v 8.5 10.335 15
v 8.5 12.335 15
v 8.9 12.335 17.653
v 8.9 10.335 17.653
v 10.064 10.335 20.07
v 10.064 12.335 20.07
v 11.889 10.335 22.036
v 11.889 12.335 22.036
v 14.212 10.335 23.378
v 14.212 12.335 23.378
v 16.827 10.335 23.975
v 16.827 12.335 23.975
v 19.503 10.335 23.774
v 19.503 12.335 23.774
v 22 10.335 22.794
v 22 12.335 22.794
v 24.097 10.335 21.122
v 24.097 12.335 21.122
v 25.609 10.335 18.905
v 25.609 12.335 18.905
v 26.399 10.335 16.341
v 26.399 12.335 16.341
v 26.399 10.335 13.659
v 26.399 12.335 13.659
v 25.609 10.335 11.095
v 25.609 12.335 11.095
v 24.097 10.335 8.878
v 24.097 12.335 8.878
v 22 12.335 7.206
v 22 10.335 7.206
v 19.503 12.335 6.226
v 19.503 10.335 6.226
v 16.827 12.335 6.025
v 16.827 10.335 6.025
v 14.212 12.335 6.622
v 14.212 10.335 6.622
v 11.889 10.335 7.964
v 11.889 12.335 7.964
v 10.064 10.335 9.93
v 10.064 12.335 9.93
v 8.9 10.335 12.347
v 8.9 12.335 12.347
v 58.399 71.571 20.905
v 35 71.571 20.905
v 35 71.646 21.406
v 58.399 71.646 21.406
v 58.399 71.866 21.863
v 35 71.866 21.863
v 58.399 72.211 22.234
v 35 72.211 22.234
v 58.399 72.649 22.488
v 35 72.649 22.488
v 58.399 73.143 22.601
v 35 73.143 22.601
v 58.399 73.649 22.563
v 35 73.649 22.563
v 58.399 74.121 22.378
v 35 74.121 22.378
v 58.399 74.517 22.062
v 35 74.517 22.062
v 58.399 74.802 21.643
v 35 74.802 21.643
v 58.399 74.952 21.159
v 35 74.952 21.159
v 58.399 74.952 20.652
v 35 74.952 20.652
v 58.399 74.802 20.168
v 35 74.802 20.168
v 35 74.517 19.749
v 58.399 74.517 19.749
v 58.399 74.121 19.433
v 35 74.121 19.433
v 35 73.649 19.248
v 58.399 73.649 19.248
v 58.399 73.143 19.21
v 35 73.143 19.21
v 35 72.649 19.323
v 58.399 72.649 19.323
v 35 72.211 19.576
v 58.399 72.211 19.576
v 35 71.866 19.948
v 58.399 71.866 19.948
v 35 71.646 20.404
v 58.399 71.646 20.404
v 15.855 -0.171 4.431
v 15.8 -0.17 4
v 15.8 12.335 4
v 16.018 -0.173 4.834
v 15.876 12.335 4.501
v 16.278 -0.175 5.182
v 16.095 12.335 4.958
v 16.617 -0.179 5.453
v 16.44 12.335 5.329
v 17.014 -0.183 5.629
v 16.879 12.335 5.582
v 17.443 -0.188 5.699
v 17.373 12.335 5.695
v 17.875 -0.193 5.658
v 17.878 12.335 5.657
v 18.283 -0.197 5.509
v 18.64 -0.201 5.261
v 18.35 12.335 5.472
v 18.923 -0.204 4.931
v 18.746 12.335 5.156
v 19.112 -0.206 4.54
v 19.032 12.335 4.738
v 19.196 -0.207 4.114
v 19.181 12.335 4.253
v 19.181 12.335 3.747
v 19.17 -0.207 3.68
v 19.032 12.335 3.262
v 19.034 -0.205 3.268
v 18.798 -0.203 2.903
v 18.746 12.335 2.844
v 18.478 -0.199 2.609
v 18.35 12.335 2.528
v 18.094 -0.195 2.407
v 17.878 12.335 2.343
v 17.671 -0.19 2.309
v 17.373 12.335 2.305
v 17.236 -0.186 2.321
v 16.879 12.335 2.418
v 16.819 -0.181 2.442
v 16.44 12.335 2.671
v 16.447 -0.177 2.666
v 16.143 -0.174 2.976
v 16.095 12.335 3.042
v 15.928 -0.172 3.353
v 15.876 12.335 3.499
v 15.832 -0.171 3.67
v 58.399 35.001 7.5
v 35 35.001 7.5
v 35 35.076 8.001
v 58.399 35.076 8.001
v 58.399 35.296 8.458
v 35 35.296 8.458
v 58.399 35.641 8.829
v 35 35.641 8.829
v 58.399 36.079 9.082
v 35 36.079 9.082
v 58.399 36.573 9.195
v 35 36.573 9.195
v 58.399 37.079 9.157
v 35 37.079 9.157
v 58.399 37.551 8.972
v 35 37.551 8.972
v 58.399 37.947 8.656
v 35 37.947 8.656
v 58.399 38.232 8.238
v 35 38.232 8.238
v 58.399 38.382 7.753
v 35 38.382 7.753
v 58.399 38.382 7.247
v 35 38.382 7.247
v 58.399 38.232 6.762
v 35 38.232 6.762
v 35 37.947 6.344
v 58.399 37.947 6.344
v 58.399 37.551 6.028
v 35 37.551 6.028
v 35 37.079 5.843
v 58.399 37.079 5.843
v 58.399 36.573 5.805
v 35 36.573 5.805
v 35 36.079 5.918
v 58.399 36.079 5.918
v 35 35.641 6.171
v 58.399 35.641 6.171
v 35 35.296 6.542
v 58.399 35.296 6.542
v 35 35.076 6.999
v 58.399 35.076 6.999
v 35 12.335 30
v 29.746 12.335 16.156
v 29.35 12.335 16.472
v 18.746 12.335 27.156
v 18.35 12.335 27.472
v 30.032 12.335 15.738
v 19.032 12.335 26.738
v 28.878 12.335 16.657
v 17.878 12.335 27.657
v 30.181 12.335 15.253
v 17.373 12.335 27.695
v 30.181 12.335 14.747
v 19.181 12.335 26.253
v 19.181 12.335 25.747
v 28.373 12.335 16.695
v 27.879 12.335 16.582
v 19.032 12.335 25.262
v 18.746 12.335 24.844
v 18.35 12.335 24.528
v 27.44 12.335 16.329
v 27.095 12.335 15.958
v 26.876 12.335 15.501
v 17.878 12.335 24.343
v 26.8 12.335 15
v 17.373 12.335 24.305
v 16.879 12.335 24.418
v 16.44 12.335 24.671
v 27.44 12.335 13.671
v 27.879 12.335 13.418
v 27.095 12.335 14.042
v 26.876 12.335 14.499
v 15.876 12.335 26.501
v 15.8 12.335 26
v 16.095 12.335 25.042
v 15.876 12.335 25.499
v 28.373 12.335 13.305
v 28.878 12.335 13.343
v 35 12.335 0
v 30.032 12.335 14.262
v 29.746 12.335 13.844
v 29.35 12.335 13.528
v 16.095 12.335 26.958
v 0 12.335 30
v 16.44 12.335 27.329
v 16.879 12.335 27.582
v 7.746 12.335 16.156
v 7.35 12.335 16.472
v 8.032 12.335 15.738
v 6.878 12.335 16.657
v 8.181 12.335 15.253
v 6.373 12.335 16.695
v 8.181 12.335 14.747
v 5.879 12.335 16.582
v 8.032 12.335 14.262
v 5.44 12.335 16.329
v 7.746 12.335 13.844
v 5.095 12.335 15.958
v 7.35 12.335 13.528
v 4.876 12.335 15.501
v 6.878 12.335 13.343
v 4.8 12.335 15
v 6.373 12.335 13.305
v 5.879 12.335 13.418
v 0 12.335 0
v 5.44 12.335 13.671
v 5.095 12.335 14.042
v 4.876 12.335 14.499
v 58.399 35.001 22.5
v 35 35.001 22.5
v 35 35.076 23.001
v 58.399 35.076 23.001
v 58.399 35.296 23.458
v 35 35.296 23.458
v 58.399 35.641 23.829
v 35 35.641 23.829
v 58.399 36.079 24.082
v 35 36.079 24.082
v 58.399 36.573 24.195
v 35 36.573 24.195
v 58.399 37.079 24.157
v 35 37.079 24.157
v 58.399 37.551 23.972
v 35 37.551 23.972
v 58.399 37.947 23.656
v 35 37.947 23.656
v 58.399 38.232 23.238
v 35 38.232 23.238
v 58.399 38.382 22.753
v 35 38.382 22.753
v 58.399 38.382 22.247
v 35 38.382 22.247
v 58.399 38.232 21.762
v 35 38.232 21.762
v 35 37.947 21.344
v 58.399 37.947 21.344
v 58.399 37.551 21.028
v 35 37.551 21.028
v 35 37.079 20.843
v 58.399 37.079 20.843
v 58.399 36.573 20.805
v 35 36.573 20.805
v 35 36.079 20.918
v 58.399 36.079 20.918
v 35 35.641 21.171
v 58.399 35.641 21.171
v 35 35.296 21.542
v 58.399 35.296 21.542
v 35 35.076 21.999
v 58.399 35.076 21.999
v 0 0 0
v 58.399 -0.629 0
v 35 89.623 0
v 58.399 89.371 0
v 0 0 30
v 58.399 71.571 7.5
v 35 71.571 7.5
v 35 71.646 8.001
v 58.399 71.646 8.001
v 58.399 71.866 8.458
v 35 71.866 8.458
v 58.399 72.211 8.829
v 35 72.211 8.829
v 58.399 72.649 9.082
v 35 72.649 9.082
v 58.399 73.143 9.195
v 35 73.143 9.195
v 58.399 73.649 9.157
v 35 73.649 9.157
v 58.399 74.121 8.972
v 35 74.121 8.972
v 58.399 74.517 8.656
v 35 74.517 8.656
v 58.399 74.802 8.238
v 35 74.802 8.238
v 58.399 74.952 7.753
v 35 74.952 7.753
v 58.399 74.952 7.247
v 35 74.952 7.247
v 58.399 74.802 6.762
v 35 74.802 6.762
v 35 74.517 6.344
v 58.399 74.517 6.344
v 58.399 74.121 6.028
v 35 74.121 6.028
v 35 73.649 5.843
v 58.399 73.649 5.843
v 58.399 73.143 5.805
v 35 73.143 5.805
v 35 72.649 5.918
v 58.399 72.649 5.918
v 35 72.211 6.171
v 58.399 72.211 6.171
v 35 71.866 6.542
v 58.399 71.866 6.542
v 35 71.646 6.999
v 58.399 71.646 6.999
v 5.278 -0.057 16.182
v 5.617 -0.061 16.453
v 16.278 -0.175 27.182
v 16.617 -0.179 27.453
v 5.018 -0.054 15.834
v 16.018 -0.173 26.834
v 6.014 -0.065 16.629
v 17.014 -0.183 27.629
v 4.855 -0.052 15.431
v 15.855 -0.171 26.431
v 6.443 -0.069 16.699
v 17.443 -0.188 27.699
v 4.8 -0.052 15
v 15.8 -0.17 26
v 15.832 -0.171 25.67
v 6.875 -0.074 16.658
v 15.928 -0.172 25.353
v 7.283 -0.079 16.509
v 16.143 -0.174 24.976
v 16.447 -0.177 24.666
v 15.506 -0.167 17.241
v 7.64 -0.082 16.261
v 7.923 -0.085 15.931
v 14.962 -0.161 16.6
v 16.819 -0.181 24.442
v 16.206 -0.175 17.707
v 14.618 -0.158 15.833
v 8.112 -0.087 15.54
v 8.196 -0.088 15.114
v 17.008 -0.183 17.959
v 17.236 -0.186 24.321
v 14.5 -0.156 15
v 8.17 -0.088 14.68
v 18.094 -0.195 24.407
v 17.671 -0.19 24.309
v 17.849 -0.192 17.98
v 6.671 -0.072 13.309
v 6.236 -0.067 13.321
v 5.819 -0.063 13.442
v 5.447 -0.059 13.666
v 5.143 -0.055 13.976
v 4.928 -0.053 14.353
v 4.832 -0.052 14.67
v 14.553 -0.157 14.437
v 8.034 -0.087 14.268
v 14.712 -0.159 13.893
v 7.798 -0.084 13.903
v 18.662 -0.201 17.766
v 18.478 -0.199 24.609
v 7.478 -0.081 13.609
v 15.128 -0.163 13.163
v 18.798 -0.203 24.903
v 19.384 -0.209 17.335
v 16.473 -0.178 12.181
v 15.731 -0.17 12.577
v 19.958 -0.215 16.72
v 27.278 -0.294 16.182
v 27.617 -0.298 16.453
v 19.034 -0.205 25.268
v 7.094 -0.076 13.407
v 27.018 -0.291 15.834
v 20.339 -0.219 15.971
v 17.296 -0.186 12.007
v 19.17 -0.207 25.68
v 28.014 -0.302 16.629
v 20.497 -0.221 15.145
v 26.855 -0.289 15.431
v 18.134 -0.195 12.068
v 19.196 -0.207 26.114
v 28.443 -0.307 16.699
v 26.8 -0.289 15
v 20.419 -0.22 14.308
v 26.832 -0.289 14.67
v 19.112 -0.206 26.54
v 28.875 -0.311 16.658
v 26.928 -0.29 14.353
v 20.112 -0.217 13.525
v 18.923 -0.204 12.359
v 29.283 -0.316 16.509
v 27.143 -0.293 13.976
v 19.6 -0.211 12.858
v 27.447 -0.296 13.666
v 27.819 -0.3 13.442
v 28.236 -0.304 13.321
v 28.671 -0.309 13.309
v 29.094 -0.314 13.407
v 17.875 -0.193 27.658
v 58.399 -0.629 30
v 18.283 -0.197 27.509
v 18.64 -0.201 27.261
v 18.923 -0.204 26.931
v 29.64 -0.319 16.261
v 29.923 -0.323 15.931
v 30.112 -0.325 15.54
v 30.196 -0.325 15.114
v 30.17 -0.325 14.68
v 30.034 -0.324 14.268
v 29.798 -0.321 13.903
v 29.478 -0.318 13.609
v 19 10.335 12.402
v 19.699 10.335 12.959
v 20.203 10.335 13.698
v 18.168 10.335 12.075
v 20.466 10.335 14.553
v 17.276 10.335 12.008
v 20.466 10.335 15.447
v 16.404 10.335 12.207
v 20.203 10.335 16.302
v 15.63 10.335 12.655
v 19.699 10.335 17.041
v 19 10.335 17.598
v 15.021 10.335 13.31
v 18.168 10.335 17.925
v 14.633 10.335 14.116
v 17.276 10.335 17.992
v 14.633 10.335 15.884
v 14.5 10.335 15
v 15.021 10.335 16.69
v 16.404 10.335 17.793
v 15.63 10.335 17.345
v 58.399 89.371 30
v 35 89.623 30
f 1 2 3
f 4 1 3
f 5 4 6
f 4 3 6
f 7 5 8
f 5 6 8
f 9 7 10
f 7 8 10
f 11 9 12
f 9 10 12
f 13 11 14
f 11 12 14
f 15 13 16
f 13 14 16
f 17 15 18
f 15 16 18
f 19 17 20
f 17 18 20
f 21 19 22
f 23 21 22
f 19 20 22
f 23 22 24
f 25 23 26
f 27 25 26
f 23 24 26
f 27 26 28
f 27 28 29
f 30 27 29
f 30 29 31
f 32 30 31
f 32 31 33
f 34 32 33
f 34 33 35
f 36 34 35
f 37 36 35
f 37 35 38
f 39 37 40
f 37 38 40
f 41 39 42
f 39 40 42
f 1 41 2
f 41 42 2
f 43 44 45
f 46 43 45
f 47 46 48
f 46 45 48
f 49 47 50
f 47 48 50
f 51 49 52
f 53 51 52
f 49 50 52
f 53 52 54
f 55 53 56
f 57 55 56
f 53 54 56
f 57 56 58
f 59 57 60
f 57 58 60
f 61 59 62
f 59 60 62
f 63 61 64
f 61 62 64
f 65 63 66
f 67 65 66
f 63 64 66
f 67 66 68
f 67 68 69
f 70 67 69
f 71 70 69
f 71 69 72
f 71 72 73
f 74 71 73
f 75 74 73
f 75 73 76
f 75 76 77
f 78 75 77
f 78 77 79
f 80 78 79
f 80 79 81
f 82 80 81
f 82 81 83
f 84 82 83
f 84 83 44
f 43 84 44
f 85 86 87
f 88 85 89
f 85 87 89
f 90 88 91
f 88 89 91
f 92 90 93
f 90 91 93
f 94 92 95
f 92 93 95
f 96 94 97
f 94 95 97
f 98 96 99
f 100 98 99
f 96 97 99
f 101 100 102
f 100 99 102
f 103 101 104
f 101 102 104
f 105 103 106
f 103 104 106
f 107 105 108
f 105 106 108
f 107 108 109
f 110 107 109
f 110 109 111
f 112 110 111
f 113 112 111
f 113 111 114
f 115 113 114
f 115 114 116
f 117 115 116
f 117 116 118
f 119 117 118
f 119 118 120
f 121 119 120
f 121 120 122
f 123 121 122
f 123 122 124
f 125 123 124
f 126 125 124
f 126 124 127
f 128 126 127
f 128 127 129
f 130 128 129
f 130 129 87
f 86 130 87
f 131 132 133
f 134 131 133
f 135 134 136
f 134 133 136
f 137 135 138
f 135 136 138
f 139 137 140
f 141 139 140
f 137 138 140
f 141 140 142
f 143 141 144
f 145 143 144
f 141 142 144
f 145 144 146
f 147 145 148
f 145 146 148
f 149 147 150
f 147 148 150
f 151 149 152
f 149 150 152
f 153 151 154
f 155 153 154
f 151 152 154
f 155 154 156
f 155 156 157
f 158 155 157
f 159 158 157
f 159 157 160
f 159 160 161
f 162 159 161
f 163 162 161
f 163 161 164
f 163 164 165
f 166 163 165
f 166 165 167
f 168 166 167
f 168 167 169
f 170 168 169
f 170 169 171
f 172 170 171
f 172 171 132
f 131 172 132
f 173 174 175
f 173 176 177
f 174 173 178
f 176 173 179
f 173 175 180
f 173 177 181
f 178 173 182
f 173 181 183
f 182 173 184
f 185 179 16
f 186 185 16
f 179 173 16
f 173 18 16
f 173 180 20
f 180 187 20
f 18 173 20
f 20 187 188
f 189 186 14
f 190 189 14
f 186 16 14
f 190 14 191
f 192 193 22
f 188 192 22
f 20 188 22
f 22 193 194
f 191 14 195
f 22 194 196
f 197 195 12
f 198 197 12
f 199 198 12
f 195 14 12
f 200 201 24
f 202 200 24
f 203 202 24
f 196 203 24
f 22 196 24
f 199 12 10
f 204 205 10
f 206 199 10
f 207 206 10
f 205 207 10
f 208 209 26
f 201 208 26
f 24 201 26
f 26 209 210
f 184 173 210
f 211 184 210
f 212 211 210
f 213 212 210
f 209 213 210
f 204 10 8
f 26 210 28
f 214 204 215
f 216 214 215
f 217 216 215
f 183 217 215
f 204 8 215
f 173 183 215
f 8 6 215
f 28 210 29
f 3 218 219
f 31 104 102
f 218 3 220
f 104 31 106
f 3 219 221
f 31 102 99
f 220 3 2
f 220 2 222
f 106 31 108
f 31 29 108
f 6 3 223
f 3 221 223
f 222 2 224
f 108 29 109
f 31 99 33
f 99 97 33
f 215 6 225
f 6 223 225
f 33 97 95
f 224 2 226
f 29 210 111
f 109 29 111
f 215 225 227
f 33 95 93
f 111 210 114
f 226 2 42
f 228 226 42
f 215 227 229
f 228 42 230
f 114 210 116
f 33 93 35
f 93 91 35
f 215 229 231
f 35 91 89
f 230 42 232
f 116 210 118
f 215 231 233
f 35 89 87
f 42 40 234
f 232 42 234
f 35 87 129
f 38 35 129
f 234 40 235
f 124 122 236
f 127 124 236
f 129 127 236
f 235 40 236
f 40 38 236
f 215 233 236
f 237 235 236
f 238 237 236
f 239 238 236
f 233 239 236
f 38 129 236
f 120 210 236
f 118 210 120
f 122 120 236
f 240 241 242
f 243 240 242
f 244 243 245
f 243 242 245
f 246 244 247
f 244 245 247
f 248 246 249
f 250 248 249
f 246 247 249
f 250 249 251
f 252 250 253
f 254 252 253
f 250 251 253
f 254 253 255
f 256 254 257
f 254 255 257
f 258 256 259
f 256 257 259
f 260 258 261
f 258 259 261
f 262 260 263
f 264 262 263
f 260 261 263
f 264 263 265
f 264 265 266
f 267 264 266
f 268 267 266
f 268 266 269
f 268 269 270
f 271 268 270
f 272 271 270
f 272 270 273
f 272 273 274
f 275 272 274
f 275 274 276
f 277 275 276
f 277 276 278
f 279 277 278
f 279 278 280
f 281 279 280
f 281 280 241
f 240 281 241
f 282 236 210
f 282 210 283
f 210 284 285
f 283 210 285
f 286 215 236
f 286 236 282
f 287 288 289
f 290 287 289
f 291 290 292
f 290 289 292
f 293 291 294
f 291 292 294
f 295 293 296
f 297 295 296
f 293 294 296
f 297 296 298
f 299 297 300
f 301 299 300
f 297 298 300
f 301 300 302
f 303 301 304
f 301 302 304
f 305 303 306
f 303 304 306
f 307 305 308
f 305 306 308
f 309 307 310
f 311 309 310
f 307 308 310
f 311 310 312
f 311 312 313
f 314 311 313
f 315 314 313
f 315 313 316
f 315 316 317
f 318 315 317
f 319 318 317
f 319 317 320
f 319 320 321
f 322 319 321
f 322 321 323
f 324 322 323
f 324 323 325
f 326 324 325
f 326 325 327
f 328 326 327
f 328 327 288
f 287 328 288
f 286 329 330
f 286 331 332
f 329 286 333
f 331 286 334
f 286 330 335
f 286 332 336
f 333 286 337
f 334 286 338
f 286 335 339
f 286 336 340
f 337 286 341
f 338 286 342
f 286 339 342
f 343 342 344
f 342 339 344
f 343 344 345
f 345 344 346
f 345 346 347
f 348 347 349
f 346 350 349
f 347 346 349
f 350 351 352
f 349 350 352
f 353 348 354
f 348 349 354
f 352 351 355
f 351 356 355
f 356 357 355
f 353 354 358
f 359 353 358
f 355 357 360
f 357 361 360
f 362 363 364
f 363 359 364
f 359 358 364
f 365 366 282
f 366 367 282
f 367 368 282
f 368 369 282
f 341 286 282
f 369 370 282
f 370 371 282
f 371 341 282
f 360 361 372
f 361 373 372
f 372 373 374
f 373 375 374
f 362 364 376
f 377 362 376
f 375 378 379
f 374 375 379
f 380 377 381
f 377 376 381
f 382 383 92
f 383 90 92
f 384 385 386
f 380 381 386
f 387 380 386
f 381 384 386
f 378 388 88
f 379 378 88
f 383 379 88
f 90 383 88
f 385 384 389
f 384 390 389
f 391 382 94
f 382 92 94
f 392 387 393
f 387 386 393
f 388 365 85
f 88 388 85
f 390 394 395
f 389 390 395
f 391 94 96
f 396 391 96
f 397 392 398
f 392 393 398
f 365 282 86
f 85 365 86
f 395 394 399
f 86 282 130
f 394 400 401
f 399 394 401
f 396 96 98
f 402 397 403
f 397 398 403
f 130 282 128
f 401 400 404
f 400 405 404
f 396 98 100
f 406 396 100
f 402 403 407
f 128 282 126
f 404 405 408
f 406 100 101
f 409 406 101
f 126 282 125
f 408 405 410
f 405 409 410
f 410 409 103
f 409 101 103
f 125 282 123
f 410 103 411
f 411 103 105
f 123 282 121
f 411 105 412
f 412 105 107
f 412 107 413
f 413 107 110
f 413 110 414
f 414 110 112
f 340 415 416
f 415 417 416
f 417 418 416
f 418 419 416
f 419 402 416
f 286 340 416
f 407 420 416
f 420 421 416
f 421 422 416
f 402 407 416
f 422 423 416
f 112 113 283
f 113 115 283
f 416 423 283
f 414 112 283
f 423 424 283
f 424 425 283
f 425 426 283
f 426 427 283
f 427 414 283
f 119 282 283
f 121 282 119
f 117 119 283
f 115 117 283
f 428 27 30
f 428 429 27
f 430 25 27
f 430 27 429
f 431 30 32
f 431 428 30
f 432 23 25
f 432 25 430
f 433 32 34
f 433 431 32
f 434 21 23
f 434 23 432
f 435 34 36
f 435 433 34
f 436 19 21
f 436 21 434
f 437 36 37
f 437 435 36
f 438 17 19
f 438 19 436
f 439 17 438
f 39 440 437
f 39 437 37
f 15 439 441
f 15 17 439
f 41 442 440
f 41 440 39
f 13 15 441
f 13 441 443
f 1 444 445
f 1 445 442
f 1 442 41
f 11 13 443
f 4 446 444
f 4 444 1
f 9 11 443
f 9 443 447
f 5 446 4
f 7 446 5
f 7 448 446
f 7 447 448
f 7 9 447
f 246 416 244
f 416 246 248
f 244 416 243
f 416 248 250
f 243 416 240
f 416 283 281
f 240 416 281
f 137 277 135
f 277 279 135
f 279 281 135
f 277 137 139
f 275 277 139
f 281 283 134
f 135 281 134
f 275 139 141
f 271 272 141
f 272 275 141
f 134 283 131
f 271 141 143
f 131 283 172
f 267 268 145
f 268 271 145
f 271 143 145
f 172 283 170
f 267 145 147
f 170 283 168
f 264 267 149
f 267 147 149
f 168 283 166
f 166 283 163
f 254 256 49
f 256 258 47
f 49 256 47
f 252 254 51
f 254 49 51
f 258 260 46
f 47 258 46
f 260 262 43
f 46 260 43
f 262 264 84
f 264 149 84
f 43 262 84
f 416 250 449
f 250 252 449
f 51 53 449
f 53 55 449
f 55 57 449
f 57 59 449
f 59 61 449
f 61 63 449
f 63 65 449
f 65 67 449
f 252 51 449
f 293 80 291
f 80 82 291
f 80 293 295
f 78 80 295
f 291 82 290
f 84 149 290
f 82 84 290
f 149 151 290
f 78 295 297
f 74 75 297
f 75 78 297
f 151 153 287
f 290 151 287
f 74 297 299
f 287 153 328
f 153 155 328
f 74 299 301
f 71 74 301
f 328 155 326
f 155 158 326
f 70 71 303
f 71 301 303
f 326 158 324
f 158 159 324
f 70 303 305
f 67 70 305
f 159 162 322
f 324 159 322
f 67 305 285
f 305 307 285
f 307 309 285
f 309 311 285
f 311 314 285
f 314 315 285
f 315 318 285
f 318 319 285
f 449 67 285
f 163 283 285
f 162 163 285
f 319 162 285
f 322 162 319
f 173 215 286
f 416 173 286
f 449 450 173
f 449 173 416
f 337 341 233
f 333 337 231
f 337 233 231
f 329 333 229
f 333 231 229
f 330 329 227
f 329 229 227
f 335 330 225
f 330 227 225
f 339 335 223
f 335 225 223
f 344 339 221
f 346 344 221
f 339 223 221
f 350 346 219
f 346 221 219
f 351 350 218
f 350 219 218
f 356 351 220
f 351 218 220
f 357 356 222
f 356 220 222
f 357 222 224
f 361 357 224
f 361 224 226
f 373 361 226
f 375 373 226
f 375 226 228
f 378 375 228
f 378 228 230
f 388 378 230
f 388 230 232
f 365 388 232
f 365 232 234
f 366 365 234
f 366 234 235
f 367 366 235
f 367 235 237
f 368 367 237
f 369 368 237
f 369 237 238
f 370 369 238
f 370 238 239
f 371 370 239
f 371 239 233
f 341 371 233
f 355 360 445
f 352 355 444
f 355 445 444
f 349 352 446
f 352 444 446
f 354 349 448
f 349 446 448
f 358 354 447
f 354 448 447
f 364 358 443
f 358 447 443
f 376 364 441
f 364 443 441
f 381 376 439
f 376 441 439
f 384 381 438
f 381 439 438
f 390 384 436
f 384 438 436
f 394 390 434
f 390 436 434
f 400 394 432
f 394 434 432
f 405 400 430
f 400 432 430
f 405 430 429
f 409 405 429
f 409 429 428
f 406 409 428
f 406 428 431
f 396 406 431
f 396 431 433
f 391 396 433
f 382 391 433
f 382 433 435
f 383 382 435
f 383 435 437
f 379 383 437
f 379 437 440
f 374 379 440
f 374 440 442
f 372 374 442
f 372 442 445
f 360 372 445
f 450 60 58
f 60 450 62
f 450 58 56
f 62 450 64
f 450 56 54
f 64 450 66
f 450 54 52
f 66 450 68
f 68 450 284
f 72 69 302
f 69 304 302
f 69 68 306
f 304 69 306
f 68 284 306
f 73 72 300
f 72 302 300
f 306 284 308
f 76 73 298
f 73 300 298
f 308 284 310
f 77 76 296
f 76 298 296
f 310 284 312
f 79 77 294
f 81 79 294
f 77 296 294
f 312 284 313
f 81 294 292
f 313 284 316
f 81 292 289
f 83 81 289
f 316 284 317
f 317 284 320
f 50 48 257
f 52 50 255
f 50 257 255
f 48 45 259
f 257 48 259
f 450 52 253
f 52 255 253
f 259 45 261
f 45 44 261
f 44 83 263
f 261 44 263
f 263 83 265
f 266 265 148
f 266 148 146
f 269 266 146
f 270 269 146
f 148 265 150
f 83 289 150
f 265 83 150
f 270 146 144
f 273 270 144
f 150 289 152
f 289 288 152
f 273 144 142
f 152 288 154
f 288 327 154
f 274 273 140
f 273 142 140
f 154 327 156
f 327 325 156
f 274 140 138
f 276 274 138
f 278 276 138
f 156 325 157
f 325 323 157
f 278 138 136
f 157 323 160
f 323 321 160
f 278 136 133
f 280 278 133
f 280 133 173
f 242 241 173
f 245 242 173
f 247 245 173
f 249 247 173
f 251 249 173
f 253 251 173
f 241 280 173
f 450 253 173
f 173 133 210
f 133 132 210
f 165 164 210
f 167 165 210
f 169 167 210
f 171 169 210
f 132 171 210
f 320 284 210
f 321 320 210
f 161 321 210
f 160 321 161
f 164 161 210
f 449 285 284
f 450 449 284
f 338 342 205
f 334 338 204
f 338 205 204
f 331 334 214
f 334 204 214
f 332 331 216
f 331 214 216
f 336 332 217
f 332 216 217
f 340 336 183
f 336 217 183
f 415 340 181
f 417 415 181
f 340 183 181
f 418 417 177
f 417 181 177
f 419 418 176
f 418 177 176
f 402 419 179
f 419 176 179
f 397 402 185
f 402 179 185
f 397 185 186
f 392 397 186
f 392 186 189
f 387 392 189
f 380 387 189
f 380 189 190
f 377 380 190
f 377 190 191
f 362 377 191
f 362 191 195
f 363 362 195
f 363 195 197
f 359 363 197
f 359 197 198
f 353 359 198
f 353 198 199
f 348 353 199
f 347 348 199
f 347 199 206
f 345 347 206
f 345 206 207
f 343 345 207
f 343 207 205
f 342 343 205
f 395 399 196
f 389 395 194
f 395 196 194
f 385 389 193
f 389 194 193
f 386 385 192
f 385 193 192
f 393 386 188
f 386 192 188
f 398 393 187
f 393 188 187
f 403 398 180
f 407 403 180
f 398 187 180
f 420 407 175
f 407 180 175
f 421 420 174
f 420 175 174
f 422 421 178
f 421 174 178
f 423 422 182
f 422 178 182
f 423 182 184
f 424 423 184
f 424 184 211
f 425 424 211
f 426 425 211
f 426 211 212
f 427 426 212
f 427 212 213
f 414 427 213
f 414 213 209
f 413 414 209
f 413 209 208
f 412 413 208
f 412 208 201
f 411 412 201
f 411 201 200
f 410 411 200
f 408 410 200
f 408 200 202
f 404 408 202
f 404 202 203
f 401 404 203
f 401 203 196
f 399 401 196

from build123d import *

# Parameters (mm, degrees)
BOSS_EXTRUDE1_DEPTH = 30
CUT_EXTRUDE1_REACH  = 103.41
SKETCH2_R           = 3
SKETCH2_R_2         = 1.7
SKETCH3_R           = 9
CUT_EXTRUDE2_DEPTH  = 2
CUT_EXTRUDE3_REACH  = 102.783
SKETCH4_R           = 1.7


with BuildPart() as part:
    # Sketch1 → Boss-Extrude1 (new body)
    with BuildSketch(Plane.XY):
        Polygon((0, 0), (58.399287612, -0.629459459), (58.399287612, 89.370540541), (35, 89.622750859), (35, 12.334557553), (0, 12.334557553), align=None)
    extrude(amount=BOSS_EXTRUDE1_DEPTH)

    # Cut-Extrude1: up to this plane
    cut_extrude1_end = Plane(origin=(0, 0, 30), z_dir=(0.010777920827534888, 0.9999419165244726, 0))
    # Sketch2 → Cut-Extrude1 (cut, up to the surface)
    with BuildSketch(Plane(origin=(0, 12.334557553, 0), x_dir=(1, 0, 0), z_dir=(0, 1, 0)), mode=Mode.PRIVATE) as cut_extrude1_sk1:
        with Locations(Location((17.5, -15, 0), (0, 0, 180))):
            Circle(SKETCH2_R)
    cut_extrude1_tool1 = split(extrude(cut_extrude1_sk1.sketch, amount=-CUT_EXTRUDE1_REACH, mode=Mode.PRIVATE), bisect_by=cut_extrude1_end, keep=Keep.BOTH, mode=Mode.PRIVATE)
    add(cut_extrude1_tool1.solids().sort_by_distance((17.5, 12.334558, 15))[0], mode=Mode.SUBTRACT)
    # Sketch2 → Cut-Extrude1 (cut, up to the surface)
    with BuildSketch(Plane(origin=(0, 12.334557553, 0), x_dir=(1, 0, 0), z_dir=(0, 1, 0)), mode=Mode.PRIVATE) as cut_extrude1_sk2:
        with Locations(Location((6.5, -15, 0), (0, 0, 180))):
            Circle(SKETCH2_R_2)
    cut_extrude1_tool2 = split(extrude(cut_extrude1_sk2.sketch, amount=-CUT_EXTRUDE1_REACH, mode=Mode.PRIVATE), bisect_by=cut_extrude1_end, keep=Keep.BOTH, mode=Mode.PRIVATE)
    add(cut_extrude1_tool2.solids().sort_by_distance((6.5, 12.334558, 15))[0], mode=Mode.SUBTRACT)
    # Sketch2 → Cut-Extrude1 (cut, up to the surface)
    with BuildSketch(Plane(origin=(0, 12.334557553, 0), x_dir=(1, 0, 0), z_dir=(0, 1, 0)), mode=Mode.PRIVATE) as cut_extrude1_sk3:
        with Locations(Location((17.5, -4, 0), (0, 0, 180))):
            Circle(SKETCH2_R_2)
    cut_extrude1_tool3 = split(extrude(cut_extrude1_sk3.sketch, amount=-CUT_EXTRUDE1_REACH, mode=Mode.PRIVATE), bisect_by=cut_extrude1_end, keep=Keep.BOTH, mode=Mode.PRIVATE)
    add(cut_extrude1_tool3.solids().sort_by_distance((17.5, 12.334558, 4))[0], mode=Mode.SUBTRACT)
    # Sketch2 → Cut-Extrude1 (cut, up to the surface)
    with BuildSketch(Plane(origin=(0, 12.334557553, 0), x_dir=(1, 0, 0), z_dir=(0, 1, 0)), mode=Mode.PRIVATE) as cut_extrude1_sk4:
        with Locations(Location((28.5, -15, 0), (0, 0, 180))):
            Circle(SKETCH2_R_2)
    cut_extrude1_tool4 = split(extrude(cut_extrude1_sk4.sketch, amount=-CUT_EXTRUDE1_REACH, mode=Mode.PRIVATE), bisect_by=cut_extrude1_end, keep=Keep.BOTH, mode=Mode.PRIVATE)
    add(cut_extrude1_tool4.solids().sort_by_distance((28.5, 12.334558, 15))[0], mode=Mode.SUBTRACT)
    # Sketch2 → Cut-Extrude1 (cut, up to the surface)
    with BuildSketch(Plane(origin=(0, 12.334557553, 0), x_dir=(1, 0, 0), z_dir=(0, 1, 0)), mode=Mode.PRIVATE) as cut_extrude1_sk5:
        with Locations(Location((17.5, -26, 0), (0, 0, 180))):
            Circle(SKETCH2_R_2)
    cut_extrude1_tool5 = split(extrude(cut_extrude1_sk5.sketch, amount=-CUT_EXTRUDE1_REACH, mode=Mode.PRIVATE), bisect_by=cut_extrude1_end, keep=Keep.BOTH, mode=Mode.PRIVATE)
    add(cut_extrude1_tool5.solids().sort_by_distance((17.5, 12.334558, 26))[0], mode=Mode.SUBTRACT)

    # Sketch3 → Cut-Extrude2 (cut)
    with BuildSketch(Plane(origin=(0, 12.334557553, 0), x_dir=(1, 0, 0), z_dir=(0, 1, 0))):
        with Locations(Location((17.5, -15, 0), (0, 0, 180))):
            Circle(SKETCH3_R)
    extrude(amount=-CUT_EXTRUDE2_DEPTH, mode=Mode.SUBTRACT)

    # Sketch4 → Cut-Extrude3 (cut, up to next)
    with BuildSketch(Plane.ZY.offset(-35), mode=Mode.PRIVATE) as cut_extrude3_sk1:
        with Locations(Location((22.5, 36.700540541, 0), (0, 0, 270))):
            Circle(SKETCH4_R)
    cut_extrude3_tool1 = extrude(cut_extrude3_sk1.sketch, amount=-CUT_EXTRUDE3_REACH, mode=Mode.PRIVATE) & part.part
    # Sketch4 → Cut-Extrude3 (cut, up to next)
    with BuildSketch(Plane.ZY.offset(-35), mode=Mode.PRIVATE) as cut_extrude3_sk2:
        with Locations(Location((7.5, 36.700540541, 0), (0, 0, 270))):
            Circle(SKETCH4_R)
    cut_extrude3_tool2 = extrude(cut_extrude3_sk2.sketch, amount=-CUT_EXTRUDE3_REACH, mode=Mode.PRIVATE) & part.part
    # Sketch4 → Cut-Extrude3 (cut, up to next)
    with BuildSketch(Plane.ZY.offset(-35), mode=Mode.PRIVATE) as cut_extrude3_sk3:
        with Locations(Location((7.5, 73.270540541, 0), (0, 0, 270))):
            Circle(SKETCH4_R)
    cut_extrude3_tool3 = extrude(cut_extrude3_sk3.sketch, amount=-CUT_EXTRUDE3_REACH, mode=Mode.PRIVATE) & part.part
    # Sketch4 → Cut-Extrude3 (cut, up to next)
    with BuildSketch(Plane.ZY.offset(-35), mode=Mode.PRIVATE) as cut_extrude3_sk4:
        with Locations(Location((20.905297153, 73.270540541, 0), (0, 0, 270))):
            Circle(SKETCH4_R)
    cut_extrude3_tool4 = extrude(cut_extrude3_sk4.sketch, amount=-CUT_EXTRUDE3_REACH, mode=Mode.PRIVATE) & part.part
    add(cut_extrude3_tool1.solids().sort_by_distance((35, 36.700541, 22.5))[0], mode=Mode.SUBTRACT)
    add(cut_extrude3_tool2.solids().sort_by_distance((35, 36.700541, 7.5))[0], mode=Mode.SUBTRACT)
    add(cut_extrude3_tool3.solids().sort_by_distance((35, 73.270541, 7.5))[0], mode=Mode.SUBTRACT)
    add(cut_extrude3_tool4.solids().sort_by_distance((35, 73.270541, 20.905297))[0], mode=Mode.SUBTRACT)


solid = part.part
